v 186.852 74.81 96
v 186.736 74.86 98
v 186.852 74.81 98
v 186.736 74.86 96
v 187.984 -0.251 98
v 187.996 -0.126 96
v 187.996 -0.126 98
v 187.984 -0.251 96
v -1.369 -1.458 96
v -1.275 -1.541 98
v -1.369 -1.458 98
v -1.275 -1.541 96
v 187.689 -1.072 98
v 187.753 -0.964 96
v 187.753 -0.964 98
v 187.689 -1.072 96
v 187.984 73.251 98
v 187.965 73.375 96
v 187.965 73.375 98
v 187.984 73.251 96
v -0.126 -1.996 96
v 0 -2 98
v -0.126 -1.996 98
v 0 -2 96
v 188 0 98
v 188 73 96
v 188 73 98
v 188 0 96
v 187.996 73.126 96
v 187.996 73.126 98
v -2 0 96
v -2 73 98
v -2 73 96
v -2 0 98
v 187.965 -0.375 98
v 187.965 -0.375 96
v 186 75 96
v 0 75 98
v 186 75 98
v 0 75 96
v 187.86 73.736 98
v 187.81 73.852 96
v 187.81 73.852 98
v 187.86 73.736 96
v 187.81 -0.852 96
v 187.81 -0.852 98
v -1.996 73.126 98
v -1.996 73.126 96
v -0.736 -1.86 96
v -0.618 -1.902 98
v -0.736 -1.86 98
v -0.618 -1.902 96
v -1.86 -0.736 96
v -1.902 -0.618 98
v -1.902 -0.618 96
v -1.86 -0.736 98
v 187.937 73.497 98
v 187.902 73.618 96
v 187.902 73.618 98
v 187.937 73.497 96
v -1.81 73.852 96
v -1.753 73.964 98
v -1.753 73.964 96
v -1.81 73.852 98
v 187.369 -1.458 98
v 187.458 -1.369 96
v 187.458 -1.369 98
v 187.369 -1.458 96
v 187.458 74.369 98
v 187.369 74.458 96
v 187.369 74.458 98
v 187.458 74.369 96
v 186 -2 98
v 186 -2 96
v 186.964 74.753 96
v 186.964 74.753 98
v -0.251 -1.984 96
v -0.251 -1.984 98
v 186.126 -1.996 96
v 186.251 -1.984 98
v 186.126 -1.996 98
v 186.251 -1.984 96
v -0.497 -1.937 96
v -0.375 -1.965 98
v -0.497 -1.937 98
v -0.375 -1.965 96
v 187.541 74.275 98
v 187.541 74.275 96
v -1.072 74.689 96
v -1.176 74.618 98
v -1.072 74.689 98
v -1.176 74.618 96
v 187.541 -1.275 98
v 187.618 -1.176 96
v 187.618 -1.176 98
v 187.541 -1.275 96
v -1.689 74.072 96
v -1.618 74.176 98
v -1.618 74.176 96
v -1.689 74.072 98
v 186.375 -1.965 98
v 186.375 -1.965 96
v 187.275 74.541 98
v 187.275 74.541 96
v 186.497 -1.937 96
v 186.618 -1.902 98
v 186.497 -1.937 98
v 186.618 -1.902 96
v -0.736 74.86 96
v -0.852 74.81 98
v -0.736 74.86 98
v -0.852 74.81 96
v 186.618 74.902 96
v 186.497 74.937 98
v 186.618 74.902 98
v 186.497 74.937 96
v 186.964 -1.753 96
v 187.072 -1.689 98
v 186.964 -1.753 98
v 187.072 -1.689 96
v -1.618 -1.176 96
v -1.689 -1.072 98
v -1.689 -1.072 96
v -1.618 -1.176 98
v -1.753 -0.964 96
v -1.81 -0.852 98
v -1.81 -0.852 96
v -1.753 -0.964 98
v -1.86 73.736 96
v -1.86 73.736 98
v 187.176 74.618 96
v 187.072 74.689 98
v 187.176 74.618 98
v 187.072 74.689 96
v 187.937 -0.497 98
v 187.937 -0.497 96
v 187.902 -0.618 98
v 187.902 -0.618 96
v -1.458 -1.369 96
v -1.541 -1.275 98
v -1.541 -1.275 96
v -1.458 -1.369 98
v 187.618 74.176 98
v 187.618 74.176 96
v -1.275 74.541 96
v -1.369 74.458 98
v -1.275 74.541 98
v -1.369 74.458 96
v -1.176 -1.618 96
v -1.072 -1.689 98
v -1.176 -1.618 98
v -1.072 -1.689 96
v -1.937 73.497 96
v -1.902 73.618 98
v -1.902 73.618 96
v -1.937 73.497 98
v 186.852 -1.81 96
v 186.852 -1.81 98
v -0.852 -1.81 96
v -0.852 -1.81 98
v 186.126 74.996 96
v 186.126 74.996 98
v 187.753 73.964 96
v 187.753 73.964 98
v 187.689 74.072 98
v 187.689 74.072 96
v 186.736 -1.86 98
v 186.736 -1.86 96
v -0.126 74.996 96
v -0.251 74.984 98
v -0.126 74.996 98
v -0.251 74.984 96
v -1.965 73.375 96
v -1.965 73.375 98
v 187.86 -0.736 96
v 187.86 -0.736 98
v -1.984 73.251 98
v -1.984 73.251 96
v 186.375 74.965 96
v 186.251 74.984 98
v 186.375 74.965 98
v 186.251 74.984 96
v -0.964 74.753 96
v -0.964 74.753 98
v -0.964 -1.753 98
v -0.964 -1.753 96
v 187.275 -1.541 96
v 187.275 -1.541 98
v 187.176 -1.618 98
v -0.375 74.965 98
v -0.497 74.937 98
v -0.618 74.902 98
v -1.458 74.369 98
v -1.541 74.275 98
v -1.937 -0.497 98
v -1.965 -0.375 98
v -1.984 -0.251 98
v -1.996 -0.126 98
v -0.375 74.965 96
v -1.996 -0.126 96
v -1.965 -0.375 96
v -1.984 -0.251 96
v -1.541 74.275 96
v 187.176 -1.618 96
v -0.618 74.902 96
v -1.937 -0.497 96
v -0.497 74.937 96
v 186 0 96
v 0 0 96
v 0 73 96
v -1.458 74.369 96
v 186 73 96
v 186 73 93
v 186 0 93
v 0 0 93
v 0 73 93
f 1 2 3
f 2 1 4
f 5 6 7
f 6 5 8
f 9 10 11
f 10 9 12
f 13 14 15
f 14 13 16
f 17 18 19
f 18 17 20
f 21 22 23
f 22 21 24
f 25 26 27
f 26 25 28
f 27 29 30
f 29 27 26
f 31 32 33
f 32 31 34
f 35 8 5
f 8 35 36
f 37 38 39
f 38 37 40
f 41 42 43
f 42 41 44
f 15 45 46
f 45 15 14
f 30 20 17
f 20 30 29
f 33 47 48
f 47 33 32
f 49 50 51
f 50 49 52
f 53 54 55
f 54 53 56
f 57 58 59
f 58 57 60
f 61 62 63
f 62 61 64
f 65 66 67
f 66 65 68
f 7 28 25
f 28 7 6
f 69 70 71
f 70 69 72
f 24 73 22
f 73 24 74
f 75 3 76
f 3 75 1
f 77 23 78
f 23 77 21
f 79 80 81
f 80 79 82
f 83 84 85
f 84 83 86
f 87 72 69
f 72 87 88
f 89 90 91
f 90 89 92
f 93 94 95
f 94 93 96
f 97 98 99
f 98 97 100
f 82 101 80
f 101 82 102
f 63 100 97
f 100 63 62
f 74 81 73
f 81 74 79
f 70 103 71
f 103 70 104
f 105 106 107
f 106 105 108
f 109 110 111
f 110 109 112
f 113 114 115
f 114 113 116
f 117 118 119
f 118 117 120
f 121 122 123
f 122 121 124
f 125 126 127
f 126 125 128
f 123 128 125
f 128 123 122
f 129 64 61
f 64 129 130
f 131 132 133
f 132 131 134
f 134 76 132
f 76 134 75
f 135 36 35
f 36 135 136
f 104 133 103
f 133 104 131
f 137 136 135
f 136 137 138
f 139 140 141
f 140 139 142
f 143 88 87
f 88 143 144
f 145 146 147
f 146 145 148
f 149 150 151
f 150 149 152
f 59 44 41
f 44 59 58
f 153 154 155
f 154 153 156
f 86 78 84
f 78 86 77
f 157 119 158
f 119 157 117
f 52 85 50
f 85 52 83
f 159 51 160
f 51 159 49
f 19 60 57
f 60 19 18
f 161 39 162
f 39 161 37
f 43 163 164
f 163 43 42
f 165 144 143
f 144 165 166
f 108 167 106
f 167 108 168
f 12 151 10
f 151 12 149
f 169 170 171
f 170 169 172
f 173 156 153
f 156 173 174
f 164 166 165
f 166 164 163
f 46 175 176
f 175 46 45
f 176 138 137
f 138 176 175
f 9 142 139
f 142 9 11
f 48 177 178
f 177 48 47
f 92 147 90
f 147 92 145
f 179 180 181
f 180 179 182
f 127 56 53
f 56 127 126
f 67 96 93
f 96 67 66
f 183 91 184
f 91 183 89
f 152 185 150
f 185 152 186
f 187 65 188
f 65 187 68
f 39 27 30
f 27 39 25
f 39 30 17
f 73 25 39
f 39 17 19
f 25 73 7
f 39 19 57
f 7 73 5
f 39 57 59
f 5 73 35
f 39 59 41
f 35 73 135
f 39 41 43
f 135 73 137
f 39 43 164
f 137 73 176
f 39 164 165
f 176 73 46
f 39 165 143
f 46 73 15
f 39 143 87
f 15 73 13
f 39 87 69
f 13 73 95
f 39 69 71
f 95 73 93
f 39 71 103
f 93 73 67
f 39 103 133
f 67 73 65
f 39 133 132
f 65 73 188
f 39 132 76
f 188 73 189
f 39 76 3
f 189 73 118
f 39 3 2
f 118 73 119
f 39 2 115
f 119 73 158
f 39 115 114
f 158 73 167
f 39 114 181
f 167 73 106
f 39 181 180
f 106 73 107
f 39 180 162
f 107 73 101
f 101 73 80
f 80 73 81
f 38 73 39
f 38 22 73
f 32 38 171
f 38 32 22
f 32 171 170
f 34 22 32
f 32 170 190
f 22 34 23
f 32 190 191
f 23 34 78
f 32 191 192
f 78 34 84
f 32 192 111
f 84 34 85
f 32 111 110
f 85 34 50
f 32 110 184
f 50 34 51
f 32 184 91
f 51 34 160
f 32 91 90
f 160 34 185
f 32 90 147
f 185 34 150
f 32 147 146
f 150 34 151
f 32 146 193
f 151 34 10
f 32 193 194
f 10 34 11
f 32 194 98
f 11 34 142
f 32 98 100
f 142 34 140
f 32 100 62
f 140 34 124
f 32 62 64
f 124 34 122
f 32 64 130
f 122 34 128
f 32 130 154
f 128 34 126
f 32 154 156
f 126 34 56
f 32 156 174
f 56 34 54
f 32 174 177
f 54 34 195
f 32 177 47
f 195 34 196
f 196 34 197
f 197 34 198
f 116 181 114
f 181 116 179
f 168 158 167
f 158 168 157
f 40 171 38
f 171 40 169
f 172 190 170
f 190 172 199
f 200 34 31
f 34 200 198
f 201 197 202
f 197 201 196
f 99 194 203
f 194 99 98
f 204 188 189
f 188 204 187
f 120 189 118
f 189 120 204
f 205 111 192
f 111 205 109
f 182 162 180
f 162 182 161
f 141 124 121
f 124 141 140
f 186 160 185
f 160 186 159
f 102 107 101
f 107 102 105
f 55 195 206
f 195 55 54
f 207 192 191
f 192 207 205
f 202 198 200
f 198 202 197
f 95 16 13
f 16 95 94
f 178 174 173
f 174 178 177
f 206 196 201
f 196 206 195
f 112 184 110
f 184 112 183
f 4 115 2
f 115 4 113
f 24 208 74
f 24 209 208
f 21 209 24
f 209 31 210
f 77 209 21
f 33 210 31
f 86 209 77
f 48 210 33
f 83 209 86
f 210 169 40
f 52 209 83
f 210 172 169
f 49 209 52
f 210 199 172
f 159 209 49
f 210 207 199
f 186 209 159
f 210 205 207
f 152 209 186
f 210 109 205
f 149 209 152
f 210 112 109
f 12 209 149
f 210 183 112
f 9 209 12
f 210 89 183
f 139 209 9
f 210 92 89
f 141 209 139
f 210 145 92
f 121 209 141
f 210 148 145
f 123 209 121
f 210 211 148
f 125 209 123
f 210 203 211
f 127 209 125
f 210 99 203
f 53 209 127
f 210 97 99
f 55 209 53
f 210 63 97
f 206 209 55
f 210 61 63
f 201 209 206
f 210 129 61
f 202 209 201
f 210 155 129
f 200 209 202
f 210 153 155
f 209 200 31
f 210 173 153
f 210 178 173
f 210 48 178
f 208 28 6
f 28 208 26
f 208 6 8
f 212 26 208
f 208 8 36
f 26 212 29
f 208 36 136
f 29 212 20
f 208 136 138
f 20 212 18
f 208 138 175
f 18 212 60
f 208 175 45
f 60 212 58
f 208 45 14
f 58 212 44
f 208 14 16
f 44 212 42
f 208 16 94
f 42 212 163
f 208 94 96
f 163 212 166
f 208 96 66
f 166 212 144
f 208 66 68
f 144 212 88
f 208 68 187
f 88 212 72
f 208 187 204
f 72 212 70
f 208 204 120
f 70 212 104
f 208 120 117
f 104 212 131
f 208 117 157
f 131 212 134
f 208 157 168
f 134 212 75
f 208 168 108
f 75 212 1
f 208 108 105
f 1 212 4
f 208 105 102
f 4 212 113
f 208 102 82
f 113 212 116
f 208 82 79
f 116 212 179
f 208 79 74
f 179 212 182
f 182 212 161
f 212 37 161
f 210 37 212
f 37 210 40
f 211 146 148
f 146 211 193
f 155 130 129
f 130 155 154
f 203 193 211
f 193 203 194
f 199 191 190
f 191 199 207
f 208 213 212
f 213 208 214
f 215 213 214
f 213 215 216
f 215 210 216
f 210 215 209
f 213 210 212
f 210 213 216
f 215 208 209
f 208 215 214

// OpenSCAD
$fn=100; // resolution
frontPlateThickness=1;
cylRoundEdgeRadius=2;

face_plate_height = 73;
face_plate_width = 186;

speakerRadius=25.5;
speakerOffset = 10;
bassWooferRadius = 20.5;

boxDepth = 45;

screwHolderSide = 10;
screwHoleRadius = 1.4;
screwHoleDepth = 10;


// faceplate
//difference() {
//union() {
//        minkowski() {
//            cylinder(r=cylRoundEdgeRadius,h=frontPlateThickness);
//            cube([face_plate_width, face_plate_height, frontPlateThickness]);
//        }
//        cube([face_plate_width, face_plate_height, frontPlateThickness+2]);
//    }
//    translate([speakerRadius + speakerOffset, speakerRadius + speakerOffset, -1])
//    cylinder(r=speakerRadius,h=(frontPlateThickness * 6));
//    
//    translate([speakerOffset * 2 + speakerRadius * 2 + bassWooferRadius, speakerOffset + bassWooferRadius, -1])
//    cylinder(r=bassWooferRadius,h=(frontPlateThickness * 6));
//    
//    translate([speakerOffset * 3 + speakerRadius * 3 + bassWooferRadius * 2, speakerOffset + speakerRadius, -1])
//    cylinder(r=speakerRadius,h=(frontPlateThickness * 6));
//}

// walls
//difference() {
//    minkowski() {
//        cylinder(r=cylRoundEdgeRadius,h=frontPlateThickness);
//        cube([face_plate_width, face_plate_height, boxDepth]);
//    }
//    translate([0,0, -2])
//    cube([face_plate_width, face_plate_height, boxDepth+6]);
//}

// back cover
union() {
    translate([0,0,boxDepth * 2 + 6])
    minkowski() {
        cylinder(r=cylRoundEdgeRadius,h=frontPlateThickness);
        cube([face_plate_width, face_plate_height, frontPlateThickness]);
    }
    translate([0,0,boxDepth * 2 + 3])
    cube([face_plate_width, face_plate_height, frontPlateThickness + 2]);
}

// corner posts with screw hole
//difference() {
//    cube([screwHolderSide, screwHolderSide, boxDepth-2]);
//    translate([screwHolderSide/2, screwHolderSide/2, boxDepth + -11])
//    cylinder(r=screwHoleRadius,h=screwHoleDepth);
//}
//
//difference() {
//    translate([face_plate_width - screwHolderSide,0,0])
//    cube([screwHolderSide, screwHolderSide, boxDepth-2]);
//    translate([face_plate_width - screwHolderSide + screwHolderSide/2, screwHolderSide/2, boxDepth + -11])
//    cylinder(r=screwHoleRadius,h=screwHoleDepth);
//}
//
//difference() {
//    translate([face_plate_width - screwHolderSide,face_plate_height - screwHolderSide,0])
//    cube([screwHolderSide, screwHolderSide, boxDepth-2]);
//    translate([face_plate_width - screwHolderSide + screwHolderSide/2, face_plate_height - screwHolderSide + screwHolderSide/2, boxDepth + -11])
//        cylinder(r=screwHoleRadius,h=screwHoleDepth);
//}
//
//difference() {
//    translate([0,face_plate_height - screwHolderSide,0])
//    cube([screwHolderSide, screwHolderSide, boxDepth-2]);
//    translate([screwHolderSide/2, face_plate_height - screwHolderSide + screwHolderSide/2, boxDepth + -11])
//    cylinder(r=screwHoleRadius,h=screwHoleDepth);
//}
